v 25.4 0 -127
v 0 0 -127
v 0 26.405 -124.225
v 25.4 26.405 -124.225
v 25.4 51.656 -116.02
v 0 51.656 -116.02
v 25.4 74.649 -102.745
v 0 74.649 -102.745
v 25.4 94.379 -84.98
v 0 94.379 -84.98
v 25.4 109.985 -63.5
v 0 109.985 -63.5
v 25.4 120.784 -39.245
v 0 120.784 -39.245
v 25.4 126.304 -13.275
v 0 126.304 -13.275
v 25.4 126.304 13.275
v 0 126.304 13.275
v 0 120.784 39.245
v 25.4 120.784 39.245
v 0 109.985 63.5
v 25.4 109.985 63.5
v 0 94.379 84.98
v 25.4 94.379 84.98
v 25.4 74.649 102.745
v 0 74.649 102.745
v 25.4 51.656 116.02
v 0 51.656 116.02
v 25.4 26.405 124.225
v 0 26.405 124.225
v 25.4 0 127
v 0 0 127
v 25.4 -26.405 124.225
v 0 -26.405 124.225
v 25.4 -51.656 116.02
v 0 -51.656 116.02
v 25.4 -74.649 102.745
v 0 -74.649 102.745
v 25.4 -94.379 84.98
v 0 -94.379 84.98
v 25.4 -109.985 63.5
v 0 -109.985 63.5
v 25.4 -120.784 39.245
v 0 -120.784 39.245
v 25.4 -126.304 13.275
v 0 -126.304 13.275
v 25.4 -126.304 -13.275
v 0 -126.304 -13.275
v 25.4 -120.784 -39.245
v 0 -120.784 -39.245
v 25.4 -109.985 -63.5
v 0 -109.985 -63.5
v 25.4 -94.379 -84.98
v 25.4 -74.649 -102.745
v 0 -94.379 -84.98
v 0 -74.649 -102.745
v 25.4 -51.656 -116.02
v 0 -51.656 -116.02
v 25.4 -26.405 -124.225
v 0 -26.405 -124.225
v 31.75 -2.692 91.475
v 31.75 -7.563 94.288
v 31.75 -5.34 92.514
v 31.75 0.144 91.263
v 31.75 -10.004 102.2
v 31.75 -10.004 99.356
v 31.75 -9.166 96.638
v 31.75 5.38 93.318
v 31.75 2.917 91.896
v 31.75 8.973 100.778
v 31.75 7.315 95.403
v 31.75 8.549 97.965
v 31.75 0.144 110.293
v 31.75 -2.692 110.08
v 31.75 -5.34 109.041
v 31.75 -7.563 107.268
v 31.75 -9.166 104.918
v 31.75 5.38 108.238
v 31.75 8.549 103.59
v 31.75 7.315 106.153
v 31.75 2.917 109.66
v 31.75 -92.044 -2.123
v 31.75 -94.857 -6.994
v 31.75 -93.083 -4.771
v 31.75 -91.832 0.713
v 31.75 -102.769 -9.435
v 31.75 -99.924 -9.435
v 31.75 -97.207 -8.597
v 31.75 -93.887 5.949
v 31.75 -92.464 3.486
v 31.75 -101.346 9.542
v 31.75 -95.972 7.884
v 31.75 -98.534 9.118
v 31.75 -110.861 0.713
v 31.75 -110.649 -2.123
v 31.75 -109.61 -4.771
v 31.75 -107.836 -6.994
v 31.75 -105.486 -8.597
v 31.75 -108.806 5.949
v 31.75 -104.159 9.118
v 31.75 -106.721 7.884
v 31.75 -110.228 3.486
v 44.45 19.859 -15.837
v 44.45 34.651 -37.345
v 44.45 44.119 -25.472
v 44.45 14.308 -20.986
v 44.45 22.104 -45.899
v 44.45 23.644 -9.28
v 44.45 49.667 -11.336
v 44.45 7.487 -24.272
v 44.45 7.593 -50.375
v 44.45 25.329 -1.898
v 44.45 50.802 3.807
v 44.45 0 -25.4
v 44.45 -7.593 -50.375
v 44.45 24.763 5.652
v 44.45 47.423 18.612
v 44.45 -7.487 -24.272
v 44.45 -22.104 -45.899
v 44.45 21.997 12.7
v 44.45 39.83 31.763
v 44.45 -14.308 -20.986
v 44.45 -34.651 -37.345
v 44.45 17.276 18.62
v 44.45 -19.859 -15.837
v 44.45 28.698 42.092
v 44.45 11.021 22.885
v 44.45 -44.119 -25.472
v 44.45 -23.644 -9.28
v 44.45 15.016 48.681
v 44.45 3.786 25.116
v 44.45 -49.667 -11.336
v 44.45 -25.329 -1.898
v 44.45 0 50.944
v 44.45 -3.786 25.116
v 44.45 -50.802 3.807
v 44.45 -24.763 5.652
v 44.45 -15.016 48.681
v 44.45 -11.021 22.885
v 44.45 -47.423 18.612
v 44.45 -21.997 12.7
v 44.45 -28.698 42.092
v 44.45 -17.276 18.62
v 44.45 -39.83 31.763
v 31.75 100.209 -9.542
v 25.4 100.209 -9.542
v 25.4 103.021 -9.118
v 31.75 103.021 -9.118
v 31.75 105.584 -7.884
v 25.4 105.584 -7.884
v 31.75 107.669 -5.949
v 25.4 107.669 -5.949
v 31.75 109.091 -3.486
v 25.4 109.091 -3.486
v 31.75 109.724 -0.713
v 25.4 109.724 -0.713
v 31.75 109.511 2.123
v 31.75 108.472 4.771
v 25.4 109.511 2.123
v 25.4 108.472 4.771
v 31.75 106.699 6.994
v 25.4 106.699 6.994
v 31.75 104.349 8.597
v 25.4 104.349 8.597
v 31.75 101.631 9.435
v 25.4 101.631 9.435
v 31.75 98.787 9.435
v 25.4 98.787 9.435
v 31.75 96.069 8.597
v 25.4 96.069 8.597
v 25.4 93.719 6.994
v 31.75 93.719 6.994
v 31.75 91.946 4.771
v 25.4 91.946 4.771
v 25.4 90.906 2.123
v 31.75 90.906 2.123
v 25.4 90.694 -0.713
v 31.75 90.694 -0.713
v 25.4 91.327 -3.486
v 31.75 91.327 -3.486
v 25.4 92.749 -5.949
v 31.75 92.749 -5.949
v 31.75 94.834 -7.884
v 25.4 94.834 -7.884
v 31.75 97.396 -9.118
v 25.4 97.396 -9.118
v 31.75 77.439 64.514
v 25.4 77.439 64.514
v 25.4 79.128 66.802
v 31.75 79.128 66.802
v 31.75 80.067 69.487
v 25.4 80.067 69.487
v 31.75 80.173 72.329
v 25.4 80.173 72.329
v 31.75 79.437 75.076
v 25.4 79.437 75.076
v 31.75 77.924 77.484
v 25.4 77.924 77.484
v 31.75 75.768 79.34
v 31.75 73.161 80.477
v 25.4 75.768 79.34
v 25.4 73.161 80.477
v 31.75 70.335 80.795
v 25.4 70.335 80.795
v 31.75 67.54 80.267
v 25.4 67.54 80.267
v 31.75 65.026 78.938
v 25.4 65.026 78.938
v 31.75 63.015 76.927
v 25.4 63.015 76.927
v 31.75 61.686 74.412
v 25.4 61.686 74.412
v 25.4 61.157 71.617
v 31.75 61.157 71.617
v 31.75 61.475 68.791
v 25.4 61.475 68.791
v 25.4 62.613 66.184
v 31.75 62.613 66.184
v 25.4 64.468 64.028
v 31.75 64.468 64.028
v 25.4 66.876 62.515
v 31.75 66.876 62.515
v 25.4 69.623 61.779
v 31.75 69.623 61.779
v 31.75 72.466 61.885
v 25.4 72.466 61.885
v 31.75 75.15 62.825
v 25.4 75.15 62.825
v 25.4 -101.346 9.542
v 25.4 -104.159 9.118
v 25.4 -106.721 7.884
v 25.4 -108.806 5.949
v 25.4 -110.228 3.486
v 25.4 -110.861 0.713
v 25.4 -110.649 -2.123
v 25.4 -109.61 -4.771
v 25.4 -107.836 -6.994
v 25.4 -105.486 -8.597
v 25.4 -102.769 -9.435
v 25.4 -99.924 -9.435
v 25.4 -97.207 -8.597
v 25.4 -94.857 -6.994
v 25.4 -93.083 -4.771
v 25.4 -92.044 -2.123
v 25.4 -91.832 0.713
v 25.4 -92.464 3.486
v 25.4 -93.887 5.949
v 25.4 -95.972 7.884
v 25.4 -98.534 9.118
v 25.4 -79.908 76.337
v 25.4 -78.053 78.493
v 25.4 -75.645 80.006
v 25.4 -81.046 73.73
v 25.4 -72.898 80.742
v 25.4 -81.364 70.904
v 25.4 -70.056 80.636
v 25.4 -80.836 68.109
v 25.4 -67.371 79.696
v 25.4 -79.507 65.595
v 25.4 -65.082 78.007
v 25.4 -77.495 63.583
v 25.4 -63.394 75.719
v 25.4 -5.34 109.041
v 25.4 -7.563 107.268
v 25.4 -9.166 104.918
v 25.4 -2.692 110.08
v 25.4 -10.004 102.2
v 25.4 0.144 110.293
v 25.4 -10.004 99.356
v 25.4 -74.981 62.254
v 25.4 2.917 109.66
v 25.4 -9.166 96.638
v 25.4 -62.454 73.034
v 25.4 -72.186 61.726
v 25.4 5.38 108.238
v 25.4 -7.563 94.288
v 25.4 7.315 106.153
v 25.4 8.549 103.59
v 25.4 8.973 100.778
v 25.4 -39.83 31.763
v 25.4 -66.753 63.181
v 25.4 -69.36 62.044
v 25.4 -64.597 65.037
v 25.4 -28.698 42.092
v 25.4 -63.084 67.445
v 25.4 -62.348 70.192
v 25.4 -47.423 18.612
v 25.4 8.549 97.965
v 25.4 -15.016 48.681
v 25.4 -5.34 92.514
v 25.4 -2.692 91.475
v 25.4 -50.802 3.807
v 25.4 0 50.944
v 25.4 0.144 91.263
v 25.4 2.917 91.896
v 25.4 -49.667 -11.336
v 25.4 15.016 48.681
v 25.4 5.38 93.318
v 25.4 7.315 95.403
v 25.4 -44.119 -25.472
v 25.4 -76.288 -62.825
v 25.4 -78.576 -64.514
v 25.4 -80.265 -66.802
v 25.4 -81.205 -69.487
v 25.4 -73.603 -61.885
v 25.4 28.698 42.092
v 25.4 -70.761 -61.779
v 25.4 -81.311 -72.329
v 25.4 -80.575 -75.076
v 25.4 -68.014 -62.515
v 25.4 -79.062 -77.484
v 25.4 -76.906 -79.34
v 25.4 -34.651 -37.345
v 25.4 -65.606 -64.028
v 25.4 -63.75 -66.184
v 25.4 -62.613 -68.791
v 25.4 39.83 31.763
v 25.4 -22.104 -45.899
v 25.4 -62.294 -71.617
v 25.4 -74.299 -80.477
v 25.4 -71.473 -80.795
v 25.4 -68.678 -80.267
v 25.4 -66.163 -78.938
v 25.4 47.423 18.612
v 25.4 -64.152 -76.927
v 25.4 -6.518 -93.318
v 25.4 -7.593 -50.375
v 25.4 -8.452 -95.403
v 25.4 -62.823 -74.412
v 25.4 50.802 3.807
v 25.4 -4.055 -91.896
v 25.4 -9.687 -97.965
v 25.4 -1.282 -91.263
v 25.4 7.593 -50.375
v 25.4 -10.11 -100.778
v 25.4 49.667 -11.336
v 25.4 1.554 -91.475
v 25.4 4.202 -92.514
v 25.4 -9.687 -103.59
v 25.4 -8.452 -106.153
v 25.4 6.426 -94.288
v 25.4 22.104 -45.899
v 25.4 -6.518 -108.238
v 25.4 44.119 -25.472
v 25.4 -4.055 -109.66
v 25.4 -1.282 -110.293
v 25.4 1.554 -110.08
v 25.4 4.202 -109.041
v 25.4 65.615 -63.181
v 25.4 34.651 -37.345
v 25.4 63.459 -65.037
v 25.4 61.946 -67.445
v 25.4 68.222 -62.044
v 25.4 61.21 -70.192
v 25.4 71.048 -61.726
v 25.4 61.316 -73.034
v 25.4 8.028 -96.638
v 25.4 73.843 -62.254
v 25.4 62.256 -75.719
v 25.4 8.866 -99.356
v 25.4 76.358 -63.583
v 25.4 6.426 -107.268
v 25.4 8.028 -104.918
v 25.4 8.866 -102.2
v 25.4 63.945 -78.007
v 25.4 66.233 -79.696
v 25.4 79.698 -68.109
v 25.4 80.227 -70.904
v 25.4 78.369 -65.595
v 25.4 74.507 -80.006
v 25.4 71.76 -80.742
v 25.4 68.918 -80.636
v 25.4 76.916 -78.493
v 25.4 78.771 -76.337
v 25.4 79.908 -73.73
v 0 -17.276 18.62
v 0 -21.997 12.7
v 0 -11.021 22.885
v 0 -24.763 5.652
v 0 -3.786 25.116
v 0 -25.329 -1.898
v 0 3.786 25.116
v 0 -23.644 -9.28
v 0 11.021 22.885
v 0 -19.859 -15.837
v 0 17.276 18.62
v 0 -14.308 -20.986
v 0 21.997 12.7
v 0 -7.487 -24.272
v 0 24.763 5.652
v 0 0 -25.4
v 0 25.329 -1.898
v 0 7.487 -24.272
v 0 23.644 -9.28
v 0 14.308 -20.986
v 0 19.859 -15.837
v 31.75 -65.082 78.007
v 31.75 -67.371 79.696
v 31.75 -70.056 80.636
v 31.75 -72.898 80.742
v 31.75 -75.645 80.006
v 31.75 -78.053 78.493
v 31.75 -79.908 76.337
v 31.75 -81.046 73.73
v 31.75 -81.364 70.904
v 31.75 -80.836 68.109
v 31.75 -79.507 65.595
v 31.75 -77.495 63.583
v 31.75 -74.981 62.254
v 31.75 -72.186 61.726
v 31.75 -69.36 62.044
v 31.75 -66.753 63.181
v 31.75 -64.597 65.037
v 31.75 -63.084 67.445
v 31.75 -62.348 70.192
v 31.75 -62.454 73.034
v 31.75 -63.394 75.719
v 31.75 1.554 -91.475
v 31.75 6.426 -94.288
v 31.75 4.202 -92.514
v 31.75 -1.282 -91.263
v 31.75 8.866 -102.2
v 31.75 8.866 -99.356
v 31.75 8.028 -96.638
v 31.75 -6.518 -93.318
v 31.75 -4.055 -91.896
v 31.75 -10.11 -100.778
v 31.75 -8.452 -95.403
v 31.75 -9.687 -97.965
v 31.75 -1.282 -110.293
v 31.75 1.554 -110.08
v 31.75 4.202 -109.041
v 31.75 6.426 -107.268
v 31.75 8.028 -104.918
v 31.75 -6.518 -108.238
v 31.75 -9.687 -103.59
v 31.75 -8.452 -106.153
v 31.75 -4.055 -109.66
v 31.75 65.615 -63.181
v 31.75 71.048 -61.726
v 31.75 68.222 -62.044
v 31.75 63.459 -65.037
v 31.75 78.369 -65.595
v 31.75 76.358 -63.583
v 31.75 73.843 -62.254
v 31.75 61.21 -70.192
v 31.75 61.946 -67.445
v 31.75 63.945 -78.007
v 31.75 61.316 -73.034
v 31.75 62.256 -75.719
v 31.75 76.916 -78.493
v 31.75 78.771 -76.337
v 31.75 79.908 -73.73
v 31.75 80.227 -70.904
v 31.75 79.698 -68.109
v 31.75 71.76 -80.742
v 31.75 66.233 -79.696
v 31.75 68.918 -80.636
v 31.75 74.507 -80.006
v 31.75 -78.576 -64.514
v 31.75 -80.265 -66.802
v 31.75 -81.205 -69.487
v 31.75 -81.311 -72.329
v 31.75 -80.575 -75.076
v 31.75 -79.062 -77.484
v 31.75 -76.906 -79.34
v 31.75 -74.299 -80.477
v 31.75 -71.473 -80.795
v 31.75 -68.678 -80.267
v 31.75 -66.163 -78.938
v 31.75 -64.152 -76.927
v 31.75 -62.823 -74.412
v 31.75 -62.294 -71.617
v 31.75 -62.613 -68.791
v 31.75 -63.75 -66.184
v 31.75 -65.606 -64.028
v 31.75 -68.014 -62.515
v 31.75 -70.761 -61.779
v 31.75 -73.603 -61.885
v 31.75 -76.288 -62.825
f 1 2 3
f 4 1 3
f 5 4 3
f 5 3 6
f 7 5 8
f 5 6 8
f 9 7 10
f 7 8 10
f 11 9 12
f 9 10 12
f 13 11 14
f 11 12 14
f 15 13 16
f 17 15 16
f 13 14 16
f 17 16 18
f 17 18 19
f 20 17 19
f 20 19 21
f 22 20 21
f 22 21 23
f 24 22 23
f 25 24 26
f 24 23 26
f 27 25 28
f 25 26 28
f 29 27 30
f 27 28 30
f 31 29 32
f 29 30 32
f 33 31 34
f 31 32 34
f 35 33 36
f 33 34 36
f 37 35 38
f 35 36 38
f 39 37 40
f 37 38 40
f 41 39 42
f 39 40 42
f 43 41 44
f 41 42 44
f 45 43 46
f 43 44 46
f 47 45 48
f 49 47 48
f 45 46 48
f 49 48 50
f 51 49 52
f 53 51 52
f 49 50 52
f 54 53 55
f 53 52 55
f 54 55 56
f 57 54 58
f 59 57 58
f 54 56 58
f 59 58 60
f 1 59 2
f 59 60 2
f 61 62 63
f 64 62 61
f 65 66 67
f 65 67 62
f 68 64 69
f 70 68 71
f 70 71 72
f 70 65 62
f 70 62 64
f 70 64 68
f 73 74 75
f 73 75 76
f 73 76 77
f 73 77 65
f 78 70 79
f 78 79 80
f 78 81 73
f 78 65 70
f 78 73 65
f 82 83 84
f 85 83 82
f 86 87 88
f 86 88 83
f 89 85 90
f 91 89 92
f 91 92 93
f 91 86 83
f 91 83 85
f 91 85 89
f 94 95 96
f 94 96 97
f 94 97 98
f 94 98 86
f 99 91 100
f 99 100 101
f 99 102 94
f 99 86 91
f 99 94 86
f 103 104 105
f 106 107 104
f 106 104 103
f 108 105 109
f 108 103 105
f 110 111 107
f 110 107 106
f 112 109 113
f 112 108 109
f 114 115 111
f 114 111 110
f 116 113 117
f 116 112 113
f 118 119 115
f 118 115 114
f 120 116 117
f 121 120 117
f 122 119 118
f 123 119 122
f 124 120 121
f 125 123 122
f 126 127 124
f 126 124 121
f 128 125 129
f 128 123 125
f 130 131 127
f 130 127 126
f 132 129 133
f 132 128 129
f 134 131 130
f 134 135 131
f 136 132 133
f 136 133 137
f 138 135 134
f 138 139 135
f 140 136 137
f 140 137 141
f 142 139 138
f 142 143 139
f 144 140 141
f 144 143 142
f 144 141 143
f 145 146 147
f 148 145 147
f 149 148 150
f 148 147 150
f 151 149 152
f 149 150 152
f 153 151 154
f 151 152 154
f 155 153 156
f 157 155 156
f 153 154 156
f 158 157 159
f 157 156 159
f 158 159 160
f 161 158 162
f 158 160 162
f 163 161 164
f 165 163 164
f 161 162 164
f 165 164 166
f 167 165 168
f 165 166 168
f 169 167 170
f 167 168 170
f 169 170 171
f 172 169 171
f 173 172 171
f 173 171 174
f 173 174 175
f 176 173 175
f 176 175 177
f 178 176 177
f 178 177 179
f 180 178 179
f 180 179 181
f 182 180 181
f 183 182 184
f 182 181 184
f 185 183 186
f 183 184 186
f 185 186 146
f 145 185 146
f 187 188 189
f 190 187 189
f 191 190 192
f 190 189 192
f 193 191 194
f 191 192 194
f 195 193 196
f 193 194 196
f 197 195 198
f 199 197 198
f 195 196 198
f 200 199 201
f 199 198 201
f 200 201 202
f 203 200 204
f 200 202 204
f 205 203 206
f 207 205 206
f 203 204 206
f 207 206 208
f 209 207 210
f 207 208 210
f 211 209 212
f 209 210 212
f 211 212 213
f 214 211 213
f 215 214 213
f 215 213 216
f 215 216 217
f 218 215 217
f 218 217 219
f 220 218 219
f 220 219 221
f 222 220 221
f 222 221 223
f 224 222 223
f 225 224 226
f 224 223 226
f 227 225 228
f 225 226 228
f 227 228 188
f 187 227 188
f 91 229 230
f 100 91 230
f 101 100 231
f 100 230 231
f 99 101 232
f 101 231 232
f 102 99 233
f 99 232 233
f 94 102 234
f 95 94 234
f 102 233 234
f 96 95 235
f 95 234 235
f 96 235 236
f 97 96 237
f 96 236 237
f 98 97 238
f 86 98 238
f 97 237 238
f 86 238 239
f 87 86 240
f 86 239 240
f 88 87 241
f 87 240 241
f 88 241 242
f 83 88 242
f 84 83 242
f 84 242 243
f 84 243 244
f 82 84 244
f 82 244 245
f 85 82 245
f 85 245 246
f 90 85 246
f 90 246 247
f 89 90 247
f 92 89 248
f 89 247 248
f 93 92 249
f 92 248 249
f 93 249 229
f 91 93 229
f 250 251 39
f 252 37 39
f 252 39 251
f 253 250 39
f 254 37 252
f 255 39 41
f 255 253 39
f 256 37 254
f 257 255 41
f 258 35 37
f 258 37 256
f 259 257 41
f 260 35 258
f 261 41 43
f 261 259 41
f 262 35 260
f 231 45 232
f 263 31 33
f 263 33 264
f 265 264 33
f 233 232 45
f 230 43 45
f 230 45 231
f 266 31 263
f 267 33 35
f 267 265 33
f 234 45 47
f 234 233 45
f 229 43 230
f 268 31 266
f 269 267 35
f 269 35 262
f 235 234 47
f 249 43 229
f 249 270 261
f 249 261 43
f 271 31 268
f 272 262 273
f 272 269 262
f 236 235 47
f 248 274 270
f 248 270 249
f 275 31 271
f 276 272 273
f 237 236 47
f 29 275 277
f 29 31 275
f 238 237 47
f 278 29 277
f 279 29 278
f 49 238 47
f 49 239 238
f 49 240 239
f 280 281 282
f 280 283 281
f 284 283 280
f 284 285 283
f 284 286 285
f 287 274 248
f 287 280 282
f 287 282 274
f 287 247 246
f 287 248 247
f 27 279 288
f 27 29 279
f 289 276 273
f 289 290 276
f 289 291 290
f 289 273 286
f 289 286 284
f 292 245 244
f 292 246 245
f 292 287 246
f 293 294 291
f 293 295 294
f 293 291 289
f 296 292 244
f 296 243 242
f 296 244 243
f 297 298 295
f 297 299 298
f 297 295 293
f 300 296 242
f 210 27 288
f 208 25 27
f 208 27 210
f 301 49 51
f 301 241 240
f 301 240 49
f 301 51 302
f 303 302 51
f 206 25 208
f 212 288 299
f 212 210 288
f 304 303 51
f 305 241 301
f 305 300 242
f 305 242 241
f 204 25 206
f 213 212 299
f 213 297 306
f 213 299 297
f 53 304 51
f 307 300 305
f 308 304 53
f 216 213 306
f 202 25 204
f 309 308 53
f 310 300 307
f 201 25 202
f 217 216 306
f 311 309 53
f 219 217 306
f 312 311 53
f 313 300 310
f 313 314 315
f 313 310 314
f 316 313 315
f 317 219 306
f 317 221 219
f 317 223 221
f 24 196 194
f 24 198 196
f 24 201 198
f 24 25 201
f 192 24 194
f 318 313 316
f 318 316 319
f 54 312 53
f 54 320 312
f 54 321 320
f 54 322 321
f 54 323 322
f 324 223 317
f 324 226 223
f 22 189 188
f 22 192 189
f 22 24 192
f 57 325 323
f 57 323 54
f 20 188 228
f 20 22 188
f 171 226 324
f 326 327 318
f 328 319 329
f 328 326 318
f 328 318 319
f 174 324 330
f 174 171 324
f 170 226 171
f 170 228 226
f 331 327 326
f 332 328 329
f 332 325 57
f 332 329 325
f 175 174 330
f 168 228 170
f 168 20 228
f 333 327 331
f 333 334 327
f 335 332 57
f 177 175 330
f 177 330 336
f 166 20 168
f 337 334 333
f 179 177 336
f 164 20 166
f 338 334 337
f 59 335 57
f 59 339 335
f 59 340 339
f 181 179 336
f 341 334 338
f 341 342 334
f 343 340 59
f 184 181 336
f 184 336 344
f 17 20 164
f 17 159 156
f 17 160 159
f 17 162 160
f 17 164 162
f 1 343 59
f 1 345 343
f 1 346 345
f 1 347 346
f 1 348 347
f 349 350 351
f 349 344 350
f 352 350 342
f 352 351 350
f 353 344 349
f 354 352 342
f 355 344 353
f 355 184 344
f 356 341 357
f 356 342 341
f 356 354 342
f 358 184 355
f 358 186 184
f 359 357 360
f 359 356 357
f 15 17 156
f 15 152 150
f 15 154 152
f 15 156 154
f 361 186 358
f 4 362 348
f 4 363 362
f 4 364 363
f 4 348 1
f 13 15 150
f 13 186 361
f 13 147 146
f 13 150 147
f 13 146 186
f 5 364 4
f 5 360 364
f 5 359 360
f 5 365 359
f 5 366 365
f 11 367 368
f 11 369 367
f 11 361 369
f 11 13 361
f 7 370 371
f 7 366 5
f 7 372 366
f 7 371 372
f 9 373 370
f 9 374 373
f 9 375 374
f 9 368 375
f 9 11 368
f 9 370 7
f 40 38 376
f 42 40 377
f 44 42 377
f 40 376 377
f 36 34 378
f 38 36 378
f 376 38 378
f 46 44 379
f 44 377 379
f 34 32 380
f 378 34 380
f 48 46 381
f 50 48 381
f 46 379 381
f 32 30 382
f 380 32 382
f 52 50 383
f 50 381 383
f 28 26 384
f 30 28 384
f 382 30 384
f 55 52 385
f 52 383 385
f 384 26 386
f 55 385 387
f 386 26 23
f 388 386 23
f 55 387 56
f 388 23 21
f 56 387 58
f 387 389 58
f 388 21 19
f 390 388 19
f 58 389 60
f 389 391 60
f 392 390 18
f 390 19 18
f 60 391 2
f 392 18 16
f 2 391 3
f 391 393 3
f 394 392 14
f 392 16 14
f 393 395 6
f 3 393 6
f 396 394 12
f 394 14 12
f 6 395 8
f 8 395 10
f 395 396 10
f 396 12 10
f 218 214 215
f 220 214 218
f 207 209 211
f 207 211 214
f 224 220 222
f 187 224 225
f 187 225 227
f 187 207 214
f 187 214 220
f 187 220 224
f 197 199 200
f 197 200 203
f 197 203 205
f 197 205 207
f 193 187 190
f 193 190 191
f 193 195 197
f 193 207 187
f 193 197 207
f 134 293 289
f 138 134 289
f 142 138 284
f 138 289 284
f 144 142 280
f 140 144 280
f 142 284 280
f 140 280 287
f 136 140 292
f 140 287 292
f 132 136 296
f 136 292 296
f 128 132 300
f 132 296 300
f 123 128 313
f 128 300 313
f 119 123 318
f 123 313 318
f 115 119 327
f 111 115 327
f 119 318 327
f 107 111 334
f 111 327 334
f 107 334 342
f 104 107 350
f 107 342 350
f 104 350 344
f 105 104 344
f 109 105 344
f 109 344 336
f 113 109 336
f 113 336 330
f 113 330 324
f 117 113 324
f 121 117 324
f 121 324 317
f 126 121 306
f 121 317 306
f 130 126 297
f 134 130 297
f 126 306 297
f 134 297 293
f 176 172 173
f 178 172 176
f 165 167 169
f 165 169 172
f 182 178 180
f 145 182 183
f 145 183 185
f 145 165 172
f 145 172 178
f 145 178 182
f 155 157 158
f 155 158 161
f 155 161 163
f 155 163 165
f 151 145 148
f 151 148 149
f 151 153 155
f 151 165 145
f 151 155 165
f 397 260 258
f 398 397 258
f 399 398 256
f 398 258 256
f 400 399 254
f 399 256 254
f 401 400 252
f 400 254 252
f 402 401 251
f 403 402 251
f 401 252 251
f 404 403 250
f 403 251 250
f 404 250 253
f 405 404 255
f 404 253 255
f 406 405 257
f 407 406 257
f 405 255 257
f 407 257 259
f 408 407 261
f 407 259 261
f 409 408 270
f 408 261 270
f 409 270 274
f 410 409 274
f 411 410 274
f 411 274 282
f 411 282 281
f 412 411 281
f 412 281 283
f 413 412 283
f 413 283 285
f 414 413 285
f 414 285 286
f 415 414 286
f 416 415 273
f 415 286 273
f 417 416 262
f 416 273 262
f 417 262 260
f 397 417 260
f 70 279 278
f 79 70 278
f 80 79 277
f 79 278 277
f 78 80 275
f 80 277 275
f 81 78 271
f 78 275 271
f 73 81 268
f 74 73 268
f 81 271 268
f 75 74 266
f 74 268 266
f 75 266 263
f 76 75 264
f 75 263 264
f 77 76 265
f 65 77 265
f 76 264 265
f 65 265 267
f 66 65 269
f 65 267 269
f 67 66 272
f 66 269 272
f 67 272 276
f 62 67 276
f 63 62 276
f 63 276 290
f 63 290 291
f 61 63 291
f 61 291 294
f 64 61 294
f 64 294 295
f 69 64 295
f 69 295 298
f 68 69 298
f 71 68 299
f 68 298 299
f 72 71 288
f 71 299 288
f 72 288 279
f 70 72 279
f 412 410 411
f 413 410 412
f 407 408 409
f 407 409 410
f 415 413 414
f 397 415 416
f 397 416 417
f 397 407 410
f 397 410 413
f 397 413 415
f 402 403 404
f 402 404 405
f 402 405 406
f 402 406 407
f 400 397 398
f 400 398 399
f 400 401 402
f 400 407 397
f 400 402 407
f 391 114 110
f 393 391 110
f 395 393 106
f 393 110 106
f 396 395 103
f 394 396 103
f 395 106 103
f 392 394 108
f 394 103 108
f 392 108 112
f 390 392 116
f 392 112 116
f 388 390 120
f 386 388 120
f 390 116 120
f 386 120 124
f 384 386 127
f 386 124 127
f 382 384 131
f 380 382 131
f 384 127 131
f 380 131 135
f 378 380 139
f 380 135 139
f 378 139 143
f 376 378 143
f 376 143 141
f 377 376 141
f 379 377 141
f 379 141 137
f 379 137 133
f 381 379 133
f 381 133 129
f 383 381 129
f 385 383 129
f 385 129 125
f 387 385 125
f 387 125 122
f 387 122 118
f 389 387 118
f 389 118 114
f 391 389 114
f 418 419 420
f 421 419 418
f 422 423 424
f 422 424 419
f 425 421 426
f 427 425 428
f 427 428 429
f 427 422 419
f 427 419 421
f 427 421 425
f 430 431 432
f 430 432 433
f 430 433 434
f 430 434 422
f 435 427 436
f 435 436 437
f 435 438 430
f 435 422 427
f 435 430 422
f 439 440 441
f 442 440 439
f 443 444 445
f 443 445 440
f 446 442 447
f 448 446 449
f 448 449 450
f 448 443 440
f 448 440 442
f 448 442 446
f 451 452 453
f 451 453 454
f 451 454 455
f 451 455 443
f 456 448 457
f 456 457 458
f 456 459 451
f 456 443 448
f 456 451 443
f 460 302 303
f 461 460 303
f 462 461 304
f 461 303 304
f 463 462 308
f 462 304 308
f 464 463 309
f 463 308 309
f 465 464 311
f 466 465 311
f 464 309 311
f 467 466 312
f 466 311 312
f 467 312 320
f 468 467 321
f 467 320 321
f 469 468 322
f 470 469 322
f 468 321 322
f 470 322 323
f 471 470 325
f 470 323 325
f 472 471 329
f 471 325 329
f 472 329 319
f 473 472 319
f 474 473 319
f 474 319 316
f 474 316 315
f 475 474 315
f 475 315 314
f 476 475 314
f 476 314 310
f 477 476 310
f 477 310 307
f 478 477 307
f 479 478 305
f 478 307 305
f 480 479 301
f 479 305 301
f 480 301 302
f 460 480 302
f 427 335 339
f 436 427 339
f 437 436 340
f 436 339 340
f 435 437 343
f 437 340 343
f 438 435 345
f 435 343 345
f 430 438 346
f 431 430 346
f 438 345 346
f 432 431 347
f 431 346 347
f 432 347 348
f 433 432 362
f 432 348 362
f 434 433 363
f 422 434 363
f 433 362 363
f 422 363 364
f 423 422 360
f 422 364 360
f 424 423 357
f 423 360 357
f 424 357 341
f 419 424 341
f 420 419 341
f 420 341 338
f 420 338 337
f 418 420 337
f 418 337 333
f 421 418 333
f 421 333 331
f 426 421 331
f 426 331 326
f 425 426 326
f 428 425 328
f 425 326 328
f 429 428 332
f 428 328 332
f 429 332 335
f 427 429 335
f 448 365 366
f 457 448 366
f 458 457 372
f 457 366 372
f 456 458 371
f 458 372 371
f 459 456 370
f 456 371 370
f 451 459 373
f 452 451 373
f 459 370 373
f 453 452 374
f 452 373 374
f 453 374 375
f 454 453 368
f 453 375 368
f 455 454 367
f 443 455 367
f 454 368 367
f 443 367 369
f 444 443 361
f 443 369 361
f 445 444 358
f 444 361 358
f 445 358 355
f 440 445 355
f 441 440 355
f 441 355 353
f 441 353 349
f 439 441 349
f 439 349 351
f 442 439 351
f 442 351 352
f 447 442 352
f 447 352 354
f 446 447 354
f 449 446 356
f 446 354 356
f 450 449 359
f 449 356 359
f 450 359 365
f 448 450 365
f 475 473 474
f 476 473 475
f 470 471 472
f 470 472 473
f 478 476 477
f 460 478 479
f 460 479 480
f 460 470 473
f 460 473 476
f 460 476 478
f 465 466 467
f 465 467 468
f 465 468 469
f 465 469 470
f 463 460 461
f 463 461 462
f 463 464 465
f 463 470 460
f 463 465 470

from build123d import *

# Parameters (mm, degrees)
SKETCH1_R           = 127
BOSS_EXTRUDE1_DEPTH = 25.4
SKETCH2_R           = 9.54156828
BOSS_EXTRUDE2_DEPTH = 6.35
CIRPATTERN1_COUNT   = 8
SKETCH3_R           = 50.944165106
BOSS_EXTRUDE3_DEPTH = 19.05
SKETCH4_R           = 25.4
CUT_EXTRUDE1_DEPTH  = 132.334


with BuildPart() as part:
    # Sketch1 → Boss-Extrude1 (new body)
    with BuildSketch(Plane(origin=(0, 0, 0), x_dir=(0, 0, -1), z_dir=(1, 0, 0))):
        Circle(SKETCH1_R)
    extrude(amount=BOSS_EXTRUDE1_DEPTH)

    # Sketch2 → Boss-Extrude2 (add)
    with BuildSketch(Plane(origin=(25.4, 0, 0), x_dir=(0, 0, -1), z_dir=(1, 0, 0))):
        with Locations((0, 100.208781769)):
            Circle(SKETCH2_R)
    boss_extrude2 = extrude(amount=BOSS_EXTRUDE2_DEPTH)

    # CirPattern1: Boss-Extrude2 ×8 about axis
    cirpattern1_axis = Axis((0, -0.568847983, 0), (1, 0, 0))
    for i in range(1, CIRPATTERN1_COUNT):
        add(boss_extrude2.rotate(cirpattern1_axis, i * 360 / CIRPATTERN1_COUNT))

    # Sketch3 → Boss-Extrude3 (add)
    with BuildSketch(Plane(origin=(25.4, 0, 0), x_dir=(0, 0, -1), z_dir=(1, 0, 0))):
        with Locations(Location((0, 0, 0), (0, 0, 180))):
            Circle(SKETCH3_R)
    extrude(amount=BOSS_EXTRUDE3_DEPTH)

    # Sketch4 → Cut-Extrude1 (cut)
    with BuildSketch(Plane(origin=(44.45, 0, 0), x_dir=(0, 0, -1), z_dir=(1, 0, 0))):
        Circle(SKETCH4_R)
    extrude(amount=-CUT_EXTRUDE1_DEPTH, mode=Mode.SUBTRACT)


solid = part.part
